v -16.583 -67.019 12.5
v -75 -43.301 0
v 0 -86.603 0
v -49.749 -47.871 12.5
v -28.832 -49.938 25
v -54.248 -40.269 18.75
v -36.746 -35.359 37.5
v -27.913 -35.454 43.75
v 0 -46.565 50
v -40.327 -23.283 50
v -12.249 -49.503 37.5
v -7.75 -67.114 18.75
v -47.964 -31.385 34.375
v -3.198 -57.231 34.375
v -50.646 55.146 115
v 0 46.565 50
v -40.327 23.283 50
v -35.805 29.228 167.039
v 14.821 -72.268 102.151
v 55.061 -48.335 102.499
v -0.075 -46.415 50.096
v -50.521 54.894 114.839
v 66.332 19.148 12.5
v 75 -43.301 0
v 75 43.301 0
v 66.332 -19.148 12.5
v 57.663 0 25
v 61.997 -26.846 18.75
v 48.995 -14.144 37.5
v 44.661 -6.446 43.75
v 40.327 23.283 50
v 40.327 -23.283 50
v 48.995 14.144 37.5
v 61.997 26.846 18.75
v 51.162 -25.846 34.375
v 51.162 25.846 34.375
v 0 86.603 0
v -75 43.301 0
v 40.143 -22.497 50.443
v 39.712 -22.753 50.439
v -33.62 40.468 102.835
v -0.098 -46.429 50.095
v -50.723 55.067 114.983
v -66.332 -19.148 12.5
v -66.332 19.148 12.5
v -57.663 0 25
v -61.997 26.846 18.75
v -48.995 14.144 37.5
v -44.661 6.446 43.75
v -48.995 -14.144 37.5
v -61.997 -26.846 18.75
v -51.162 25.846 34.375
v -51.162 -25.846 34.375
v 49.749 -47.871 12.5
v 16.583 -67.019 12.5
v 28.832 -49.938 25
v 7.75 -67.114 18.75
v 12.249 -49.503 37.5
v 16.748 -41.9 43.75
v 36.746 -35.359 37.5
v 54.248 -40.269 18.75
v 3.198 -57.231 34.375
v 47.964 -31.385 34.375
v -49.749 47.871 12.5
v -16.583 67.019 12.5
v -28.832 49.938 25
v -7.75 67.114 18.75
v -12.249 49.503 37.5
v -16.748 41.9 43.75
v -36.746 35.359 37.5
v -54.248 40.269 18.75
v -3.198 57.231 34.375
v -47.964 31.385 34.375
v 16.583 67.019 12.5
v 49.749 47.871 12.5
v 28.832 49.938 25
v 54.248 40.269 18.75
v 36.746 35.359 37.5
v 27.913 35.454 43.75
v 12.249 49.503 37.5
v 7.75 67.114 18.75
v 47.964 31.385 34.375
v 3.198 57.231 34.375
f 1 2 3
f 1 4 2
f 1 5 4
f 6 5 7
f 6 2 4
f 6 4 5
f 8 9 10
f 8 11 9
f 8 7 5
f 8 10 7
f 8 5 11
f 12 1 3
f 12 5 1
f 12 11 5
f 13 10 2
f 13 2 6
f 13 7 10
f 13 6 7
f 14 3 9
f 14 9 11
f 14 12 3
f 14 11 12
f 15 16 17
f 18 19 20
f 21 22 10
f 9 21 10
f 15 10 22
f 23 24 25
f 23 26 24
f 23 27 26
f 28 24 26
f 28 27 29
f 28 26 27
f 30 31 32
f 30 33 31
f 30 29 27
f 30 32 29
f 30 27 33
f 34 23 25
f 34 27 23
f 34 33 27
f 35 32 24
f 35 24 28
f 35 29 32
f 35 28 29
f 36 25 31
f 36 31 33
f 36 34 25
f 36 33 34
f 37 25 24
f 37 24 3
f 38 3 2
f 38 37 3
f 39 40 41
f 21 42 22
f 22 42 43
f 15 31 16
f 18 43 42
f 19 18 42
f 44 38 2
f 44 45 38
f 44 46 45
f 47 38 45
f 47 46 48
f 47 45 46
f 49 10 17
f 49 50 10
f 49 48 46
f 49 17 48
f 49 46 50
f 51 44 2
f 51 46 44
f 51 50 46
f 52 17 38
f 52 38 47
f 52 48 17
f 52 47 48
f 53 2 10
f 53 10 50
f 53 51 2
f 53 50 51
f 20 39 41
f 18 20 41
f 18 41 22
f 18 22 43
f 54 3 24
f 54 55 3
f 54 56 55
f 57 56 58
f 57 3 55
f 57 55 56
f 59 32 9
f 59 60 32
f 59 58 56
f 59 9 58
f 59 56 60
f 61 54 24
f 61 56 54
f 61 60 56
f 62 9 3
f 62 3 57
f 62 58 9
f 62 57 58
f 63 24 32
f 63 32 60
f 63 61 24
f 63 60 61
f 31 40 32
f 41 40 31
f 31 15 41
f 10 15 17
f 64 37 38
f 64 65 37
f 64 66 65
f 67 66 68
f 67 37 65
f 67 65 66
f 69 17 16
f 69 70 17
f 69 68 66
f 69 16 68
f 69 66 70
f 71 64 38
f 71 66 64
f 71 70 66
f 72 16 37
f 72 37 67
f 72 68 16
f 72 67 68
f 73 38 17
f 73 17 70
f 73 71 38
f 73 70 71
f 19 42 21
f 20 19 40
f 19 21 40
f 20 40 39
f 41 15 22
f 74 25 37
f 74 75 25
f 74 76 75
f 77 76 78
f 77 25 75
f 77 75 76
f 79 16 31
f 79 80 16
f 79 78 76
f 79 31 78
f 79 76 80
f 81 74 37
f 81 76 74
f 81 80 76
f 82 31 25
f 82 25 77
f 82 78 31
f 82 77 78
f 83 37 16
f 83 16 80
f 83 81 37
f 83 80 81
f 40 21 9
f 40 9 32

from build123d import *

# Parameters (mm, degrees)
F9_DEPTH = 60


with BuildPart() as f3:
    # F0 (on Top) → F3 section 0
    with BuildSketch(Plane.XY):
        Polygon((75, 43.3012701892), (0, 86.6025403784), (-75, 43.3012701892), (-75, -43.3012701892), (0, -86.6025403784), (75, -43.3012701892), align=None)
    # F2 (on offset) → F3 section 1
    with BuildSketch(Plane.XY.offset(50)):
        Polygon((40.3265245185, 23.2825297862), (0, 46.5650595725), (-40.3265245185, 23.2825297862), (-40.3265245185, -23.2825297862), (0, -46.5650595725), (40.3265245185, -23.2825297862), align=None)
    loft()

    # F3_face (on face) → F6 section 0
    with BuildSketch(Plane.XY.offset(50), mode=Mode.PRIVATE) as f6_s0:
        Polygon((40.3265245185, -23.2825297862), (40.3265245185, 23.2825297862), (0, 46.5650595725), (-40.3265245185, 23.2825297862), (-40.3265245185, -23.2825297862), (0, -46.5650595725), align=None)
    loft([f6_s0.sketch, Vertex(-50.6460405886, 55.1455877721, 115)])

    # F8 (on offset) → F9 (join)
    with BuildSketch(Plane(origin=(15.7716130811, -27.3172351738, 55.0342066068), x_dir=(0.9685974066, 0.1105451644, -0.2227079489), z_dir=(0.2486343981, -0.4306474099, 0.8675965332))):
        Polygon((25.1611340791, 2.2766380571), (-68.6507374048, 100.4471331835), (-16.3836460561, -19.314782694), align=None)
    extrude(amount=F9_DEPTH)


solid = f3.part
